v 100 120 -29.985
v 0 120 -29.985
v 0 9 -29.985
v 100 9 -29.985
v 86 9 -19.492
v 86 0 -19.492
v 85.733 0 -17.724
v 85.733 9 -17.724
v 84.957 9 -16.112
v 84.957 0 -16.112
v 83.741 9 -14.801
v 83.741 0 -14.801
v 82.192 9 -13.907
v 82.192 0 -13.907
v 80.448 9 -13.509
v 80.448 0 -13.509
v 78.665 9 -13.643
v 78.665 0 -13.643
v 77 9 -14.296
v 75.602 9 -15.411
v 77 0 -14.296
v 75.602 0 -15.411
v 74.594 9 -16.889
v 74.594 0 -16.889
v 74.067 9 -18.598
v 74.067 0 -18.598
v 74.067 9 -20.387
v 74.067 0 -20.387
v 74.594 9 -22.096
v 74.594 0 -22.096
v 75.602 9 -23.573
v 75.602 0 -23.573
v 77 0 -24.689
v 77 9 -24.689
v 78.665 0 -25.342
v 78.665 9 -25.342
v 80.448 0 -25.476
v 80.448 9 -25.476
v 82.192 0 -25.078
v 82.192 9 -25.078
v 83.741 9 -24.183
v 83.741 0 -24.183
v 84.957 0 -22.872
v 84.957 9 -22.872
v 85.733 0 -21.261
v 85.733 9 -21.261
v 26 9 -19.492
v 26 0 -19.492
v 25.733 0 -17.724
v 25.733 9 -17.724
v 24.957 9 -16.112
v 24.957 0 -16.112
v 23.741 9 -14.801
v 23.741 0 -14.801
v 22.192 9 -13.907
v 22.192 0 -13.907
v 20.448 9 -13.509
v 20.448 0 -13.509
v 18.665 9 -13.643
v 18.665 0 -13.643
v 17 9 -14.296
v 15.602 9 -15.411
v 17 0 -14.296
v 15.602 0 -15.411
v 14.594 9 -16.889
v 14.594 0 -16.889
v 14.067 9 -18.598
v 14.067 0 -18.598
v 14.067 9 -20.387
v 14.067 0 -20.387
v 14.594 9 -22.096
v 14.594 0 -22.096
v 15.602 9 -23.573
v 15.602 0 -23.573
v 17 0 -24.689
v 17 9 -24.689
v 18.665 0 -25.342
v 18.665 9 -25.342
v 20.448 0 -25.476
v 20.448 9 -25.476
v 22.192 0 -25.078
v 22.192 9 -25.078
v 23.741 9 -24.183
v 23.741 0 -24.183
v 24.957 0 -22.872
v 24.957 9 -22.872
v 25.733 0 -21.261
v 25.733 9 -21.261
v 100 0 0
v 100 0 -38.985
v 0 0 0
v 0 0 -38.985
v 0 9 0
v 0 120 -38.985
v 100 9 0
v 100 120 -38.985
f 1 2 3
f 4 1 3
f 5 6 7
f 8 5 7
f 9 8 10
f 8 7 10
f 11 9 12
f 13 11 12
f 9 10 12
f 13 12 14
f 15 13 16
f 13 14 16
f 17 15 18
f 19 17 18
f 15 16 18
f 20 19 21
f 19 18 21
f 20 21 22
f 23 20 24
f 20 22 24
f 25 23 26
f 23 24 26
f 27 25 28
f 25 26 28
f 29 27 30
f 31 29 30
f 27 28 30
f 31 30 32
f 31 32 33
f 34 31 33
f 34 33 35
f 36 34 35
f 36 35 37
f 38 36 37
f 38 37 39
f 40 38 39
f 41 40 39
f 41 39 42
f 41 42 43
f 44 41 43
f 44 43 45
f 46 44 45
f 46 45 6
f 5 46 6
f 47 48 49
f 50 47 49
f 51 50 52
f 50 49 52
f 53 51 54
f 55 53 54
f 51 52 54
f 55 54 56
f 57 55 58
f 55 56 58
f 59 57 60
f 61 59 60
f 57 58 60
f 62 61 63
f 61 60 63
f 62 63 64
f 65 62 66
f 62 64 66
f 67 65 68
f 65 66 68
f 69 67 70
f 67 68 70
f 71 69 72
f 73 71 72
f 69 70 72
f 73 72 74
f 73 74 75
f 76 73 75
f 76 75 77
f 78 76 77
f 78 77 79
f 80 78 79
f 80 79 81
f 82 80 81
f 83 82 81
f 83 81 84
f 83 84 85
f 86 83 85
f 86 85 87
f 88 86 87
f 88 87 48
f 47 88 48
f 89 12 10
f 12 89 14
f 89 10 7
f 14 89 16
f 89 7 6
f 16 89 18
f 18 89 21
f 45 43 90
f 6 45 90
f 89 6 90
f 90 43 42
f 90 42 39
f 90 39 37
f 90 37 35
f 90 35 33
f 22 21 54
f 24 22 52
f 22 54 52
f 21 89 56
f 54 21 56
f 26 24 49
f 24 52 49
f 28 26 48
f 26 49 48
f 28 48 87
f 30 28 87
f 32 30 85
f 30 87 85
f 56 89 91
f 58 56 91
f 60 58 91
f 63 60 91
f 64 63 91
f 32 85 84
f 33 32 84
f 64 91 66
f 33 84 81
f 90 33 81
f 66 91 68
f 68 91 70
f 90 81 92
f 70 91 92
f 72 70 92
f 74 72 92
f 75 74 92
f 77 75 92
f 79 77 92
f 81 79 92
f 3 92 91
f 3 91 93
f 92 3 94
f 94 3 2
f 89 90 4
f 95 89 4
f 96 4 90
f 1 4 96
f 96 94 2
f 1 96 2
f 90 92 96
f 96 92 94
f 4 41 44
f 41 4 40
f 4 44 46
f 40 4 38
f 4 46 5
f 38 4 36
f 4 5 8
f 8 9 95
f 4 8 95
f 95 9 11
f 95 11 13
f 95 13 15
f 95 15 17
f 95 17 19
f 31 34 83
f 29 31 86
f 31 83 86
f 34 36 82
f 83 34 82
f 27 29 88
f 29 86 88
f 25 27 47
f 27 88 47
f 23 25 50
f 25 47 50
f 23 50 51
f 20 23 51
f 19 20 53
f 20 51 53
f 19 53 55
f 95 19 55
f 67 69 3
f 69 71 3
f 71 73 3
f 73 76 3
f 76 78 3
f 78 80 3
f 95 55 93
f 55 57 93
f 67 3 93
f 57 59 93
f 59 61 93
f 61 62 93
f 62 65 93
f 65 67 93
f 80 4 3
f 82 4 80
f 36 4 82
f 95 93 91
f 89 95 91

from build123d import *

# Parameters (mm, degrees)
F1_DEPTH = 100
F2_R     = 6
F3_DEPTH = 25


with BuildPart() as f1:
    # F0 (on Right) → F1 (new body)
    with BuildSketch(Plane.YZ):
        Polygon((9, 0), (0, 0), (0, -38.9847982002), (120, -38.9847982002), (120, -29.9847982002), (9, -29.9847982002), align=None)
    extrude(amount=F1_DEPTH)

    # F2 (on face) → F3 (cut)
    with BuildSketch(Plane.XZ):
        with Locations((20, -19.4923991001)):
            Circle(F2_R)
        with Locations((80, -19.4923991001)):
            Circle(F2_R)
    extrude(amount=-F3_DEPTH, mode=Mode.SUBTRACT)


solid = f1.part
